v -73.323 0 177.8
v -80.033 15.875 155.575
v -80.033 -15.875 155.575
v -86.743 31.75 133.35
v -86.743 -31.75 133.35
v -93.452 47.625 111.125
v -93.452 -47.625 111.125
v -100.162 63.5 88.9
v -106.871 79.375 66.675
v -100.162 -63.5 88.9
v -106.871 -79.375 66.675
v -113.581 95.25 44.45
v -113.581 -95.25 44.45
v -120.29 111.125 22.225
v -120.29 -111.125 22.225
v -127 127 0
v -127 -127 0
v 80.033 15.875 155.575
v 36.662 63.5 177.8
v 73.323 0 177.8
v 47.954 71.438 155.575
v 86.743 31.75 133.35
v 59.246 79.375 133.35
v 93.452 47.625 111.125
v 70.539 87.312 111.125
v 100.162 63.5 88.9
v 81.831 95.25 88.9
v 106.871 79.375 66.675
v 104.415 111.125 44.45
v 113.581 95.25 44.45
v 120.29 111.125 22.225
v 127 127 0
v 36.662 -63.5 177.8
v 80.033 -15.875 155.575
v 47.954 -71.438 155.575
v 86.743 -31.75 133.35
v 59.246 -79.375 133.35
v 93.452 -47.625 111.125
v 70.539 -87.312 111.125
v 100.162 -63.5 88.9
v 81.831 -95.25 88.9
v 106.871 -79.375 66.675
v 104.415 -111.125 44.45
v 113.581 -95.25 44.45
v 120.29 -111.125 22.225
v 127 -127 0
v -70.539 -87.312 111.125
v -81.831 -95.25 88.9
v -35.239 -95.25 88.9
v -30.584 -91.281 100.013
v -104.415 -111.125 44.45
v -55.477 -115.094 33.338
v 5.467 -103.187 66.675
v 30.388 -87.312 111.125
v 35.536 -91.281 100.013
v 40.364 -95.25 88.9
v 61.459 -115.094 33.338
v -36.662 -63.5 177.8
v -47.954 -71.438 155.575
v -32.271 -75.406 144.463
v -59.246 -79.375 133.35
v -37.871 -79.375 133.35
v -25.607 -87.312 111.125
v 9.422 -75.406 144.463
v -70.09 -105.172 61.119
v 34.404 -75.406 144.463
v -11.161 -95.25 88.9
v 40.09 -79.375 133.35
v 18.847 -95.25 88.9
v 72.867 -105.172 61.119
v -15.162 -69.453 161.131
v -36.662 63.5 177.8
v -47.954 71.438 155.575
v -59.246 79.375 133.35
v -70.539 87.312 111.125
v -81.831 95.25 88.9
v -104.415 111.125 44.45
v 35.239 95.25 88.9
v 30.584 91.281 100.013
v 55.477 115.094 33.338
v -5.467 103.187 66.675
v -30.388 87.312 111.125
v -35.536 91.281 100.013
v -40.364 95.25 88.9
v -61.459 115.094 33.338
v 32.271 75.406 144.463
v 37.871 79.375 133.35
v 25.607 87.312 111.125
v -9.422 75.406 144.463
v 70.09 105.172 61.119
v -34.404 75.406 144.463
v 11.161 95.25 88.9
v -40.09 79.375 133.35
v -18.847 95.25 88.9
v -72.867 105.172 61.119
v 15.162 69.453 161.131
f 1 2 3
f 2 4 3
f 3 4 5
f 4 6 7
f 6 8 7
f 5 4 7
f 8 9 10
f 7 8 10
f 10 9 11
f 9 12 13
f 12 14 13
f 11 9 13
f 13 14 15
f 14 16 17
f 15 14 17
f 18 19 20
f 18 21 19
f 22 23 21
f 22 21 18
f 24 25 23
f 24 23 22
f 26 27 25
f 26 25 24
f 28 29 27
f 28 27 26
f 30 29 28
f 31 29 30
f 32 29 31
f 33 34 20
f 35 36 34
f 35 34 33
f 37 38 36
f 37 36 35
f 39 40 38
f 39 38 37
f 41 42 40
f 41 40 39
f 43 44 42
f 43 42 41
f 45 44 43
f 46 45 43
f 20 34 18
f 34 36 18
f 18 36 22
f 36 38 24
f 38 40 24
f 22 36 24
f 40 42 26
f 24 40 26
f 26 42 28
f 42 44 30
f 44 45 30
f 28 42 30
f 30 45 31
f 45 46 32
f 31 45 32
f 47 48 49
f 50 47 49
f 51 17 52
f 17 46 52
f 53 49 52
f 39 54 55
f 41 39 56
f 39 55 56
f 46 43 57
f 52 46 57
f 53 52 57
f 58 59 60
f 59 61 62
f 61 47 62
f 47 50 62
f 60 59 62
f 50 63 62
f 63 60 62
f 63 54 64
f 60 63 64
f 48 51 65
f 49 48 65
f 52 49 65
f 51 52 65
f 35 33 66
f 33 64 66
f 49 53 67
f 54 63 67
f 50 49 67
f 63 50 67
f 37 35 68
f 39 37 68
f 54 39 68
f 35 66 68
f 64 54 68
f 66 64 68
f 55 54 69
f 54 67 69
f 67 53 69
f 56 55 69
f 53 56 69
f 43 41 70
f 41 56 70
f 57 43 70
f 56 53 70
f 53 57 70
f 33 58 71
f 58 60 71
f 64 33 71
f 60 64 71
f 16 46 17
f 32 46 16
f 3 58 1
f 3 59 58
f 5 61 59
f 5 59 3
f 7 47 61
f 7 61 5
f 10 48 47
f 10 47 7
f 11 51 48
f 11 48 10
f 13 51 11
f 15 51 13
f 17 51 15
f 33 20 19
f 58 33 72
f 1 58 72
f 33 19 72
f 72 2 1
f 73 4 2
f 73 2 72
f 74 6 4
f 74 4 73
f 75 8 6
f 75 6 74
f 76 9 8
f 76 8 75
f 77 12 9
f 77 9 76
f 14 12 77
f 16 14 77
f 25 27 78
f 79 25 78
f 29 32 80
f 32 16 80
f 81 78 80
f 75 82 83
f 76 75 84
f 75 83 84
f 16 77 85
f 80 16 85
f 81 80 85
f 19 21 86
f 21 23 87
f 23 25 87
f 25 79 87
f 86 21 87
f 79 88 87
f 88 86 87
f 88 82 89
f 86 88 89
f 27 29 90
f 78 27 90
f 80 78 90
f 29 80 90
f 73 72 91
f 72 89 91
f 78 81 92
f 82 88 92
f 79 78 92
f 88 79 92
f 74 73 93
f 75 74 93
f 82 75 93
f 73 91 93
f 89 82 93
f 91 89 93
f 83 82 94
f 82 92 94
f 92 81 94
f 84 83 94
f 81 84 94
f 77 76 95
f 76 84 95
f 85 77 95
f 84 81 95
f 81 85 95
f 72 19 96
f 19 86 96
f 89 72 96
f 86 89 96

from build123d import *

# Parameters (mm, degrees)
F0_W = 254
F0_H = 254


with BuildPart() as f3:
    # F2 (on offset) → F3 section 0
    with BuildSketch(Plane.XY.offset(177.8)):
        Polygon((-36.6617420935, -63.5), (36.6617420935, -63.5), (73.3234841871, -63.5), (73.3234841871, 63.5), (36.6617420935, 63.5), (-36.6617420935, 63.5), (-73.3234841871, 63.5), (-73.3234841871, -63.5), align=None)
    # F0 (on Top) → F3 section 1
    with BuildSketch(Plane.XY):
        Rectangle(F0_W, F0_H)
    loft()


with BuildPart() as f5:
    # F4 (on offset) → F5 section 0
    with BuildSketch(Plane.XY.offset(177.8), mode=Mode.PRIVATE) as f5_s0:
        Polygon((36.6617420935, 63.5), (73.3234841871, 0), (73.3234841871, 63.5), align=None)
    loft([f5_s0.sketch, Vertex(127, 127, 0)])


with BuildPart() as f6:
    # F4 (on offset) → F6 section 0
    with BuildSketch(Plane.XY.offset(177.8), mode=Mode.PRIVATE) as f6_s0:
        Polygon((-73.3234841871, 63.5), (-73.3234841871, 0), (-36.6617420935, 63.5), align=None)
    loft([f6_s0.sketch, Vertex(-127, 127, 0)])


with BuildPart() as f7:
    # F4 (on offset) → F7 section 0
    with BuildSketch(Plane.XY.offset(177.8), mode=Mode.PRIVATE) as f7_s0:
        Polygon((-73.3234841871, -63.5), (-36.6617420935, -63.5), (-73.3234841871, 0), align=None)
    loft([f7_s0.sketch, Vertex(-127, -127, 0)])


with BuildPart() as f8:
    # F4 (on offset) → F8 section 0
    with BuildSketch(Plane.XY.offset(177.8), mode=Mode.PRIVATE) as f8_s0:
        Polygon((73.3234841871, 0), (36.6617420935, -63.5), (73.3234841871, -63.5), align=None)
    loft([f8_s0.sketch, Vertex(127, -127, 0)])


with BuildPart() as f3_1:
    add(f3.part)

    # F9: cut F5, F6, F7, F8
    add(f5.part, mode=Mode.SUBTRACT)
    add(f6.part, mode=Mode.SUBTRACT)
    add(f7.part, mode=Mode.SUBTRACT)
    add(f8.part, mode=Mode.SUBTRACT)


solid = f3_1.part
